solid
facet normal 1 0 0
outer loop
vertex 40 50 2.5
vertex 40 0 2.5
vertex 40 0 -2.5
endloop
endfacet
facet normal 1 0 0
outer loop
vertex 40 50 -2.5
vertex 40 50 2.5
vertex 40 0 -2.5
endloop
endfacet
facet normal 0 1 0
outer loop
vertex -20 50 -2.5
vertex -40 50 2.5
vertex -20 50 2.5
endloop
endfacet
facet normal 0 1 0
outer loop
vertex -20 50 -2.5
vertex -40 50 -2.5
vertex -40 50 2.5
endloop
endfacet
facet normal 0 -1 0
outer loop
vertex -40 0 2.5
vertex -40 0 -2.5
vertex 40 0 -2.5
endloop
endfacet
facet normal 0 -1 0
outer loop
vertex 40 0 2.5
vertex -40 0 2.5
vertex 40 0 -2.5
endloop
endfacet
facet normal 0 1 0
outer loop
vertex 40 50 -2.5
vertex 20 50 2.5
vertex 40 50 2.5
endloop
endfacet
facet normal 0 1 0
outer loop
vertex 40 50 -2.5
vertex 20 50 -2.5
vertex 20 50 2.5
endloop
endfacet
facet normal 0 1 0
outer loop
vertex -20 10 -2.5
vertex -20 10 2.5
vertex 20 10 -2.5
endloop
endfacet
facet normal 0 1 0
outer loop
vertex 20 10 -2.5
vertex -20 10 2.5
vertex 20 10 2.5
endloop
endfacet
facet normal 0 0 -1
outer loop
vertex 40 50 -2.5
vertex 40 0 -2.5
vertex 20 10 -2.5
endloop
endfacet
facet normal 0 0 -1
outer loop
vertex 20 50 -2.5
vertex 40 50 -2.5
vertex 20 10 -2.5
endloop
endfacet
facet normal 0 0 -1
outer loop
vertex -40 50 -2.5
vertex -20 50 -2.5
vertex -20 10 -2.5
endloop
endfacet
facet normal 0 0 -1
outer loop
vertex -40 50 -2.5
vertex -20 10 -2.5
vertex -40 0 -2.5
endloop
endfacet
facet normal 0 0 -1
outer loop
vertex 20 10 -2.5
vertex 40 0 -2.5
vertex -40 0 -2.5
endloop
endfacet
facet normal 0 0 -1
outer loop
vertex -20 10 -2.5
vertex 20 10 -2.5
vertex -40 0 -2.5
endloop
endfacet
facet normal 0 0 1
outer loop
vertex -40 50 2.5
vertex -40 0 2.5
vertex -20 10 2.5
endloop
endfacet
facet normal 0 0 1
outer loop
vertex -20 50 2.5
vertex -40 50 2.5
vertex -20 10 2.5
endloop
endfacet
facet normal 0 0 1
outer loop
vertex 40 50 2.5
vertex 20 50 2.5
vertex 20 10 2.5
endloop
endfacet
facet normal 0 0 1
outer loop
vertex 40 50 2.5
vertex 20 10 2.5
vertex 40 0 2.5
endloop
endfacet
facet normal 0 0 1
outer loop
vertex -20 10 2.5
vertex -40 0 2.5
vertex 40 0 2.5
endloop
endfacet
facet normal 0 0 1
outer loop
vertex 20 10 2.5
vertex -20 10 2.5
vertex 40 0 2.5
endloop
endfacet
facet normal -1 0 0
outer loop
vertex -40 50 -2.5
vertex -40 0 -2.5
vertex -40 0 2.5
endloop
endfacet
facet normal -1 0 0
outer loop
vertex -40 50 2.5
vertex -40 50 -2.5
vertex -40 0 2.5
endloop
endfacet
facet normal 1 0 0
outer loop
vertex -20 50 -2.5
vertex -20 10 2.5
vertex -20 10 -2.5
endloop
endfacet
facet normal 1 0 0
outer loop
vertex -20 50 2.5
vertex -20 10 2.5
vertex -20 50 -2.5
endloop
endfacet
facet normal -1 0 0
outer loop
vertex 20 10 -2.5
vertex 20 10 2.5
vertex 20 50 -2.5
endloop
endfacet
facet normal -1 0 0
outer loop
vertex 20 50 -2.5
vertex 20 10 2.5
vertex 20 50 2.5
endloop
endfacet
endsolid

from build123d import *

# Parameters (mm, degrees)
BOSS_EXTRUDE1_DEPTH = 50
SKETCH2_W           = 40
SKETCH2_H           = 40
CUT_EXTRUDE1_DEPTH  = 50


with BuildPart() as part:
    # Sketch1 → Boss-Extrude1 (new body)
    with BuildSketch(Plane(origin=(0, 0, 0), x_dir=(1, 0, 0), z_dir=(0, 1, 0))):
        Polygon((40, -2.5), (40, 0), (40, 2.5), (-40, 2.5), (-40, -2.5), align=None)
    extrude(amount=BOSS_EXTRUDE1_DEPTH)

    # Sketch2 → Cut-Extrude1 (cut)
    with BuildSketch(Plane.XY.offset(2.5)):
        with Locations((0, 30)):
            Rectangle(SKETCH2_W, SKETCH2_H)
    extrude(amount=-CUT_EXTRUDE1_DEPTH, mode=Mode.SUBTRACT)


solid = part.part
